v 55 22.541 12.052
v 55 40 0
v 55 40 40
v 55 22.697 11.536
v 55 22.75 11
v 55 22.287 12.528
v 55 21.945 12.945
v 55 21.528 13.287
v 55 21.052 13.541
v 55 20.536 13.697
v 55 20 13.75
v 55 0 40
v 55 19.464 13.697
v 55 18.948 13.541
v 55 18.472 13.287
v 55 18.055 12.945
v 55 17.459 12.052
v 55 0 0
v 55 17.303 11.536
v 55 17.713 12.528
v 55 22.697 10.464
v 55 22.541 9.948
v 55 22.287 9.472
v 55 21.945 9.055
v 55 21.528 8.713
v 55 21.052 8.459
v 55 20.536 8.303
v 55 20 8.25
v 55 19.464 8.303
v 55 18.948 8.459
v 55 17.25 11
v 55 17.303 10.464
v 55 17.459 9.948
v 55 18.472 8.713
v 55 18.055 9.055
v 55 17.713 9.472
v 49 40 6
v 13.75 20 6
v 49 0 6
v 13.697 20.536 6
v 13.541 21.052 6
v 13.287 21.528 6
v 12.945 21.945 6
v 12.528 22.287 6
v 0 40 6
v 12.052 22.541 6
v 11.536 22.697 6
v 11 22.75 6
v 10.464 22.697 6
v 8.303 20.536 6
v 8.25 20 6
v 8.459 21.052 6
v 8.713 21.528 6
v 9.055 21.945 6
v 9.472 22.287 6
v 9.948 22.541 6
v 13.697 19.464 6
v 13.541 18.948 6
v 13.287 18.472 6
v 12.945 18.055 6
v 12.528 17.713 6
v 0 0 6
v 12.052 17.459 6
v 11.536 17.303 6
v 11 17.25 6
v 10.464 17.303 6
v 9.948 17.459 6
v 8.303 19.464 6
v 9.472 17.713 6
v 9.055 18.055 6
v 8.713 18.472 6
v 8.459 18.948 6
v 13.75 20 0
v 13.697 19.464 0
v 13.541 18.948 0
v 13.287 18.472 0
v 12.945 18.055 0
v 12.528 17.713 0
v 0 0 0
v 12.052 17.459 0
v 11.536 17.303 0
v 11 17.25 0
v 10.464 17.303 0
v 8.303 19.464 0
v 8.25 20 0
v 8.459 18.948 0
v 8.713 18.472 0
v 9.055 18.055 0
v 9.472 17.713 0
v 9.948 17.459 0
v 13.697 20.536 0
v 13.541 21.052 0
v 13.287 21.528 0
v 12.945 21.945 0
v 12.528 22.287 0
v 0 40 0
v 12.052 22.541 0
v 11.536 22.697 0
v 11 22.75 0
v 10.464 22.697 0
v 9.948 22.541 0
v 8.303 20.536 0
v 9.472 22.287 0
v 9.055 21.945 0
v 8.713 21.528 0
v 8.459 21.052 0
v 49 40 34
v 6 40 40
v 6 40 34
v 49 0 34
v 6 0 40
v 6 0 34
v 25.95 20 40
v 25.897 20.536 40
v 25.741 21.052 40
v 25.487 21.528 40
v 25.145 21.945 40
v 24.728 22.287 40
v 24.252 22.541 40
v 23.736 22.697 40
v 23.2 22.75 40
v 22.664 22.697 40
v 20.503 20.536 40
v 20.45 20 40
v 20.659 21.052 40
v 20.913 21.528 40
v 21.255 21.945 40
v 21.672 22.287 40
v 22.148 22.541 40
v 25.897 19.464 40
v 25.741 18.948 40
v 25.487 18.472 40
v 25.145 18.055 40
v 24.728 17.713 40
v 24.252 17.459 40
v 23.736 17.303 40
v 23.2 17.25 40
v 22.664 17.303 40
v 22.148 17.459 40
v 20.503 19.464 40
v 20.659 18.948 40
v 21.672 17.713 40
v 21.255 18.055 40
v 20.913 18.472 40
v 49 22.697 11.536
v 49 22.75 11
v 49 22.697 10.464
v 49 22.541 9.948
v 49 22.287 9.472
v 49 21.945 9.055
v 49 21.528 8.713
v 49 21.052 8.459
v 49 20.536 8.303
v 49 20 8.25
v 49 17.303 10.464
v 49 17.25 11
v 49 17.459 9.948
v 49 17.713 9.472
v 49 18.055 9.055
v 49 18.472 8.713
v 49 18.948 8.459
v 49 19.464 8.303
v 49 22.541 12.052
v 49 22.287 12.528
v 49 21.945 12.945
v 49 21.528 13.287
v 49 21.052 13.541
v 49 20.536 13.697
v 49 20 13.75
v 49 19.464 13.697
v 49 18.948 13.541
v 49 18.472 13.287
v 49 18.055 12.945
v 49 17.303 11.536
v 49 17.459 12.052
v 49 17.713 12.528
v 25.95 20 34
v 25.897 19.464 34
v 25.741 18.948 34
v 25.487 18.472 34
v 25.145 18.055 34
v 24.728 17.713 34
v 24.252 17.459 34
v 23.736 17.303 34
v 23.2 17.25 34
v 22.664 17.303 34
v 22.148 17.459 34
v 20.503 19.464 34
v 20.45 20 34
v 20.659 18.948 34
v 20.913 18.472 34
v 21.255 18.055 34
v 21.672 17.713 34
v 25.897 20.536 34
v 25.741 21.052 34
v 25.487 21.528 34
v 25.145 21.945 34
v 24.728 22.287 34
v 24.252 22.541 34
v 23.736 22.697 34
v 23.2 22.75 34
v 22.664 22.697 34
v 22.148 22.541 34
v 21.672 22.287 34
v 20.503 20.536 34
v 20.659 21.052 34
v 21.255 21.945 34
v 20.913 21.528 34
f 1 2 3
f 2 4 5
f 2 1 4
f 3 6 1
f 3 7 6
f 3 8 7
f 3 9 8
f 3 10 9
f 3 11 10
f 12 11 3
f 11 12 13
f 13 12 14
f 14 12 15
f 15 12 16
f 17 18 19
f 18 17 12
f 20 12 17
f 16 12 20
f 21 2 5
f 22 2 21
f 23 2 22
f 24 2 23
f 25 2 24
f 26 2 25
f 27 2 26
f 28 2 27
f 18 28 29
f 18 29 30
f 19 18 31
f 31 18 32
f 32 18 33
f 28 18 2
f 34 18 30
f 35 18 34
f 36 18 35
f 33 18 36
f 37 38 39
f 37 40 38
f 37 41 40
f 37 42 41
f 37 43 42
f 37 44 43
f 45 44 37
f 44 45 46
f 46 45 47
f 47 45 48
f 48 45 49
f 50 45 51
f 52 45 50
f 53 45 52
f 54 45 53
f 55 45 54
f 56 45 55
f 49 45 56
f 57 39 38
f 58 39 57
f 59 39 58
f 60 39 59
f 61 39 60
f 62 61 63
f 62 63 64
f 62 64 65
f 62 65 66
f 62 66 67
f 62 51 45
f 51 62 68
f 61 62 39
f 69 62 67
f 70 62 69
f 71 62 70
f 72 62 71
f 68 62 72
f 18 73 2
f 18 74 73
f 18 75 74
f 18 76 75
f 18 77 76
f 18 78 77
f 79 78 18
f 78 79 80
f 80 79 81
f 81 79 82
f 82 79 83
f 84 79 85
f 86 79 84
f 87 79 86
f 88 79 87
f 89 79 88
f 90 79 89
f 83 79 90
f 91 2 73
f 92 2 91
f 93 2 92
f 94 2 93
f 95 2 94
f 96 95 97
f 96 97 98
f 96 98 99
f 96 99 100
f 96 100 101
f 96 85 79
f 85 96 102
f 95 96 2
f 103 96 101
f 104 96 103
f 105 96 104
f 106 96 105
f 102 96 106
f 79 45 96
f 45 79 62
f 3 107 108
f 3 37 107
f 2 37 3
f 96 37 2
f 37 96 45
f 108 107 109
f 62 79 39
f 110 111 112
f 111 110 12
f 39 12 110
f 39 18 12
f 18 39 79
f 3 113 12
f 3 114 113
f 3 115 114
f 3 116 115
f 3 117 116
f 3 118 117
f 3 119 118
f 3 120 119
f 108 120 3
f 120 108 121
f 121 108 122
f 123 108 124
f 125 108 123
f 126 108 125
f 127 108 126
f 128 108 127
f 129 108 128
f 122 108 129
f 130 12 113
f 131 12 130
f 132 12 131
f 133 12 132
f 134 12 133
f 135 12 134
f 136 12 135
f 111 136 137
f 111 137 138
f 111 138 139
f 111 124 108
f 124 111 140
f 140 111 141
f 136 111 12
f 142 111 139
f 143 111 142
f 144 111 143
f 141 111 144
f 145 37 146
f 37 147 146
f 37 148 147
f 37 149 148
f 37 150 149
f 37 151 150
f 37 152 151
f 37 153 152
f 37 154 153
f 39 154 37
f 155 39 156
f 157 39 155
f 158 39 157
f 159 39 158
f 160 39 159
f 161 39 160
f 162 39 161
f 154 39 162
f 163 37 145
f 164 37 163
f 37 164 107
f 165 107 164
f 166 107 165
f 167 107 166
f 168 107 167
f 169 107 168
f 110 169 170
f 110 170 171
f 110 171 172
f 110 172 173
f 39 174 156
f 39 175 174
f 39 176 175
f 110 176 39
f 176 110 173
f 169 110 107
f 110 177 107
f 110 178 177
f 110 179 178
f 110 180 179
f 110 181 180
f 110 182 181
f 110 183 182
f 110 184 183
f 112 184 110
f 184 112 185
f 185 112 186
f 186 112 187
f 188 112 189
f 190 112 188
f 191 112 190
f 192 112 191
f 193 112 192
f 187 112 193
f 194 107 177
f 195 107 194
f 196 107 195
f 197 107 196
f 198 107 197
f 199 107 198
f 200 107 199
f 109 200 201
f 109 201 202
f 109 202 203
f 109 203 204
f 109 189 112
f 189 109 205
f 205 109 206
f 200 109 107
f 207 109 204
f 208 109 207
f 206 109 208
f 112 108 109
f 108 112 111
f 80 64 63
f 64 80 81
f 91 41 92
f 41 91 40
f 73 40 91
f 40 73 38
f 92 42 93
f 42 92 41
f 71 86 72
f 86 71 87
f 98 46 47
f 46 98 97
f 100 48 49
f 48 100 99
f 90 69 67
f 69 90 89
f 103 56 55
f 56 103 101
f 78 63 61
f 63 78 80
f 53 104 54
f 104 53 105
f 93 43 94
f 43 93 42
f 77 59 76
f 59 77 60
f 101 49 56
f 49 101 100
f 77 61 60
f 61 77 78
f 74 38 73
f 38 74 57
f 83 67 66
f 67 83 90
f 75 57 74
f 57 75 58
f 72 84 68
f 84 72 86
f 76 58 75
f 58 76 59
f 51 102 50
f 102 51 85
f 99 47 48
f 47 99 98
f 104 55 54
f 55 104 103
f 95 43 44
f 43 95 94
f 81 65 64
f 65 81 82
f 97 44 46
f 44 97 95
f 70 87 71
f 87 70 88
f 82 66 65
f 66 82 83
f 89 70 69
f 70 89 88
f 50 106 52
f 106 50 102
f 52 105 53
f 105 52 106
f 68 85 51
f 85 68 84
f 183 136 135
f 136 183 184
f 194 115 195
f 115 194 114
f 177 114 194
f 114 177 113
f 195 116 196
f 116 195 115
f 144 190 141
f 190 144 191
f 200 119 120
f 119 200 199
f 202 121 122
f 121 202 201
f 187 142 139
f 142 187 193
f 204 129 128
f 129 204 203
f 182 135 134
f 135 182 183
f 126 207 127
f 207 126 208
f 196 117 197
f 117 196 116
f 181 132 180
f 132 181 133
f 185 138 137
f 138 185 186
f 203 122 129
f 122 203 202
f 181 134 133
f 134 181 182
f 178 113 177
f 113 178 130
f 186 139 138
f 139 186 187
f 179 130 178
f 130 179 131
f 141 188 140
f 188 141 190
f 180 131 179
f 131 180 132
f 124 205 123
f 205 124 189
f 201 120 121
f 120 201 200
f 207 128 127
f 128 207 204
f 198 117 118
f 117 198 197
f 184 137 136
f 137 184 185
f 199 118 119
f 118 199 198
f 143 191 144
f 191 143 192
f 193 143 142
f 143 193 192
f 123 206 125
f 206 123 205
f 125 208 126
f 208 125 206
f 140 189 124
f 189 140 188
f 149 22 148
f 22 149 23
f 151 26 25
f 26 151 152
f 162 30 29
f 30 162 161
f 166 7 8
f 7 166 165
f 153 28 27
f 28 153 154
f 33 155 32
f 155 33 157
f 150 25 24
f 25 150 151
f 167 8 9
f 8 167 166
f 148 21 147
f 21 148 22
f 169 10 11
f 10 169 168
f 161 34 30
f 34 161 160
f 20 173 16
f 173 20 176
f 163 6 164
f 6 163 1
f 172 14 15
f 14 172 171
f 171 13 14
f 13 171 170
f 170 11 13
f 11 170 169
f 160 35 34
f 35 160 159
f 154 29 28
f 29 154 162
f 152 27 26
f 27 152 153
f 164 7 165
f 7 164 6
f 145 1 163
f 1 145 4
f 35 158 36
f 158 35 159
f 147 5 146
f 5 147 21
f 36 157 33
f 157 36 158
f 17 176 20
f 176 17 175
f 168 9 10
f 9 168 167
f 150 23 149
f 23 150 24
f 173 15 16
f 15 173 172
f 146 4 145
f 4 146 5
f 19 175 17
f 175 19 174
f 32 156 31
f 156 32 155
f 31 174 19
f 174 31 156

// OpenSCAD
$fn = 32;

// ----------------------------------------------------------------------
// Z-bracket: 55 x 40 x 40 mm
// ----------------------------------------------------------------------

// --- parameters (mm) ---
bottom_run = 55;          // lower foot length, X
top_run = 43;             // upper foot length, X
profile_w = 40;           // bracket width, Y
height = 40;              // overall rise, Z
mat_t = 6;                // plate thickness
hole_d = 5.5;             // clearance for M5

module hole_z(px, py, z0) {
  translate([px, py, z0 - 0.5]) cylinder(h = mat_t + 1, d = hole_d);
}
module hole_x(py, pz) {
  translate([-0.5, py, pz]) rotate([0, 90, 0]) cylinder(h = mat_t + 1, d = hole_d);
}

difference() {
  union() {
    cube([bottom_run, profile_w, mat_t]);
    /* web, overlapping the lower foot */
    translate([bottom_run - mat_t, 0, 0]) cube([mat_t, profile_w, height]);
    /* upper foot, sunk into the web */
    translate([bottom_run - mat_t - top_run, 0, height - mat_t]) cube([top_run + mat_t, profile_w, mat_t]);
  }
  hole_z(11, 20, 0);
  translate([bottom_run - mat_t - 25.8, 0, 0]) hole_z(0, 20, height - mat_t);
  translate([bottom_run - mat_t, 0, 0]) hole_x(20, 11);
}
